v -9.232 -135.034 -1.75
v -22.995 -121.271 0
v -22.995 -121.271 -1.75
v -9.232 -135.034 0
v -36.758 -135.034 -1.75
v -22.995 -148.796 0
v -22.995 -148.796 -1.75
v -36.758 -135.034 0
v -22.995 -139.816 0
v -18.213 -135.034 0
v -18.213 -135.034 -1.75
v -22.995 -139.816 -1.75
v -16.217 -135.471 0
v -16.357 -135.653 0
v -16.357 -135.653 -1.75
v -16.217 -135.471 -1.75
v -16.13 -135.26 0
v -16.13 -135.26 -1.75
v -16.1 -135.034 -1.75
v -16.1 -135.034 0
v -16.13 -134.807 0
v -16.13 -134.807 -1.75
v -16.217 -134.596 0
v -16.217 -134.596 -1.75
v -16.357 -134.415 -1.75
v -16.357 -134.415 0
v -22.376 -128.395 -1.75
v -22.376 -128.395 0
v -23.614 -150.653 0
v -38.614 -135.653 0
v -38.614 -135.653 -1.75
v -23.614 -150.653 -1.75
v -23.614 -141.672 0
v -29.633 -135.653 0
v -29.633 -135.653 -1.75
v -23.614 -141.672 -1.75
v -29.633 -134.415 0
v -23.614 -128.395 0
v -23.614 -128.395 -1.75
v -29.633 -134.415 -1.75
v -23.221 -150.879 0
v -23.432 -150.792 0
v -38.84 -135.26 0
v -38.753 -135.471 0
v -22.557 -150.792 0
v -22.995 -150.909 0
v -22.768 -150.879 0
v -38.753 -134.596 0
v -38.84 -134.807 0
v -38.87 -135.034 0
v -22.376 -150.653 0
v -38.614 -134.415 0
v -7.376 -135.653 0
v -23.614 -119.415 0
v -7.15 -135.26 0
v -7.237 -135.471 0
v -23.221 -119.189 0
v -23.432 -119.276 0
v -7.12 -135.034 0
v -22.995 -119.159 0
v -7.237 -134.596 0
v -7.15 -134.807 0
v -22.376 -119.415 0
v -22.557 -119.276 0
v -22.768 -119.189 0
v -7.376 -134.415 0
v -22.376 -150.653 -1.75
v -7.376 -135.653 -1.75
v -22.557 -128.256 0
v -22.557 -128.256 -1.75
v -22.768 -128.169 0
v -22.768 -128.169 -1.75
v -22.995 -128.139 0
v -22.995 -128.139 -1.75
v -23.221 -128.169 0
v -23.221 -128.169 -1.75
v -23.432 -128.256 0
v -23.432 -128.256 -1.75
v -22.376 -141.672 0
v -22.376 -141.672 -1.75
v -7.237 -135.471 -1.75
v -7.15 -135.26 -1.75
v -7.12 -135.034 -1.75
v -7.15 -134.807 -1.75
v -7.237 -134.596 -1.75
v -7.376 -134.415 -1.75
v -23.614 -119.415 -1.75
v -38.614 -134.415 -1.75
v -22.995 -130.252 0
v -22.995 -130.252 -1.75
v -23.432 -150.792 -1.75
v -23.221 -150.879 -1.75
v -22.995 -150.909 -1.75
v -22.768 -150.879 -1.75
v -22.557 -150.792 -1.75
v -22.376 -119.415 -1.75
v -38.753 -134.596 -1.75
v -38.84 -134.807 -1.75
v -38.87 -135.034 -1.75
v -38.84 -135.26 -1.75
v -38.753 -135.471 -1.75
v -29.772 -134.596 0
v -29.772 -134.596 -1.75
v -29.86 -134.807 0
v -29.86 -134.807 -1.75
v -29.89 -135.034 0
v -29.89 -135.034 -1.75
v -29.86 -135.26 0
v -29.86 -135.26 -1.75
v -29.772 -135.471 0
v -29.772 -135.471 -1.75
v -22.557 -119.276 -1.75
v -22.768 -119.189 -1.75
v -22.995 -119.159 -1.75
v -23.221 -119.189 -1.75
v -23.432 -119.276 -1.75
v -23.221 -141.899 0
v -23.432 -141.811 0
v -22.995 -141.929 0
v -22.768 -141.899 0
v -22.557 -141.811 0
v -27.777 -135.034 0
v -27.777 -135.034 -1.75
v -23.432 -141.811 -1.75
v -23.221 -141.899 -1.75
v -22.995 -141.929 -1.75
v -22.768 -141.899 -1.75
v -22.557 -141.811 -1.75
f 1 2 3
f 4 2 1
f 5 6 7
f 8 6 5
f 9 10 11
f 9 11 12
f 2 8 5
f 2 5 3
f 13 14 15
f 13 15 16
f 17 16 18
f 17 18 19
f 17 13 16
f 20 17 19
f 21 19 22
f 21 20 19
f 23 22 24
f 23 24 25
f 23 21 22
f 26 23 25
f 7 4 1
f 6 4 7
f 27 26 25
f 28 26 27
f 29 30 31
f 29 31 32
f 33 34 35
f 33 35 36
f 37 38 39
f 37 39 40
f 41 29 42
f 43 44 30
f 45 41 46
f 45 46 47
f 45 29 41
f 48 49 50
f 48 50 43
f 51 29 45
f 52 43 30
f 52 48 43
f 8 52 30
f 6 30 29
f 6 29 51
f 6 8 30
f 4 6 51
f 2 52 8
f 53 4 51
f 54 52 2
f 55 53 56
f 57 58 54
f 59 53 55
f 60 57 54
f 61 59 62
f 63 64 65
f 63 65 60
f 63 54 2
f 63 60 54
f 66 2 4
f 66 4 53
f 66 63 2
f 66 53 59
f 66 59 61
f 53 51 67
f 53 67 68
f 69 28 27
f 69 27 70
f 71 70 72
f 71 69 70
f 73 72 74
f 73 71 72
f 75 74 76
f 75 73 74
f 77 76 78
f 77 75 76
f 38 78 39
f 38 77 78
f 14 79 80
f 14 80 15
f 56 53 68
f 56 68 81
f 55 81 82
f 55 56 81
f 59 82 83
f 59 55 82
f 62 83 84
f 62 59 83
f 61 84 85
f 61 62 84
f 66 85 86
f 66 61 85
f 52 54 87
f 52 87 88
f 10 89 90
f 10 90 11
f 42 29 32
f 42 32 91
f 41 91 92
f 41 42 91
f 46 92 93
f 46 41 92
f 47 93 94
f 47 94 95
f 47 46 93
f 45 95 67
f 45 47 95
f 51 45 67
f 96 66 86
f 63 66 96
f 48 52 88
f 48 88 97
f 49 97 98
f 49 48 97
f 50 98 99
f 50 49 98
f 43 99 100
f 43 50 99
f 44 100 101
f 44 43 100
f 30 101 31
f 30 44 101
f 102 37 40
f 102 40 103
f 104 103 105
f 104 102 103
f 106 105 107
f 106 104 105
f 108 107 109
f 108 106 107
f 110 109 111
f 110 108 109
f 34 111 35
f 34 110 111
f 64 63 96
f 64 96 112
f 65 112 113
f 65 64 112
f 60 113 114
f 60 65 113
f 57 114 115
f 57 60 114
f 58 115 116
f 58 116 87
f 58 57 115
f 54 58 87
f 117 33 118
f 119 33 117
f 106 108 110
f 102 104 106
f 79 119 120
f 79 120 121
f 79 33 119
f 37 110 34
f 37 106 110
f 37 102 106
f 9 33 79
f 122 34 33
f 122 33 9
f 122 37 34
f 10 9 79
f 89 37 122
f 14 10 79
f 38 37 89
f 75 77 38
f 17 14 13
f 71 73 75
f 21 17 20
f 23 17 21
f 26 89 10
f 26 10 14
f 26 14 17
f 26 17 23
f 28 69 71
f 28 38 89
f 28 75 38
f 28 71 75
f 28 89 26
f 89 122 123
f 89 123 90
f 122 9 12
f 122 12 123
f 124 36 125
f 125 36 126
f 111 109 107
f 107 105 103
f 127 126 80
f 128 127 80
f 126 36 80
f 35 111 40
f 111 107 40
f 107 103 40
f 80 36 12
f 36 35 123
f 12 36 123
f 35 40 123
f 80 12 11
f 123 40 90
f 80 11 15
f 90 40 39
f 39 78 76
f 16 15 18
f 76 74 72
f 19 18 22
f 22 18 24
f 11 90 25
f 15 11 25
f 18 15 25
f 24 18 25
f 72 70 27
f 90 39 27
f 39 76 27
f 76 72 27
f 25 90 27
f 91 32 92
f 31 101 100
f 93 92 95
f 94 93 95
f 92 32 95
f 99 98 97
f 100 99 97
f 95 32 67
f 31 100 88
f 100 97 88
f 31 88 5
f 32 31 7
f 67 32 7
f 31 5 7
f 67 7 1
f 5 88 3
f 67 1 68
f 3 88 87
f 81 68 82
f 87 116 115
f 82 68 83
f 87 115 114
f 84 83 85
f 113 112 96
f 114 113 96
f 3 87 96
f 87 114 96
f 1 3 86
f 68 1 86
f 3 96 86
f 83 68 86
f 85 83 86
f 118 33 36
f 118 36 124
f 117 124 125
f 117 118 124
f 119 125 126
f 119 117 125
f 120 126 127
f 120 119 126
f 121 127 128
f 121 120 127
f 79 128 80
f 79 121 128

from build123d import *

# Parameters (mm, degrees)
BOSS_EXTRUDE1_DEPTH   = 1.75
BOSS_EXTRUDE1_2_DEPTH = 1.75


with BuildPart() as part:
    # Sketch2 → Boss-Extrude1 (new body)
    with BuildSketch(Plane.XY):
        with BuildLine():
            Line((-22.376246782, -150.652582773), (-7.376246782, -135.652582773))
            ThreePointArc((-7.376246782, -135.652582773), (-7.119965216, -135.03386434), (-7.376246782, -134.415145906))
            Line((-7.376246782, -134.415145906), (-22.376246782, -119.415145906))
            ThreePointArc((-22.376246782, -119.415145906), (-22.994965216, -119.15886434), (-23.613683649, -119.415145906))
            Line((-23.613683649, -119.415145906), (-38.613683649, -134.415145906))
            ThreePointArc((-38.613683649, -134.415145906), (-38.869965216, -135.03386434), (-38.613683649, -135.652582773))
            Line((-38.613683649, -135.652582773), (-23.613683649, -150.652582773))
            ThreePointArc((-23.613683649, -150.652582773), (-22.994965216, -150.90886434), (-22.376246782, -150.652582773))
        make_face()
        Polygon((-22.994965216, -121.271301207), (-9.232402083, -135.03386434), (-22.994965216, -148.796427473), (-36.757528349, -135.03386434), align=None, mode=Mode.SUBTRACT)
    extrude(amount=-BOSS_EXTRUDE1_DEPTH)


with BuildPart() as body_2:
    # Sketch2 → Boss-Extrude1 2 (new body)
    with BuildSketch(Plane.XY):
        with BuildLine():
            Line((-22.376246782, -141.672326652), (-16.356502903, -135.652582773))
            ThreePointArc((-16.356502903, -135.652582773), (-16.100221337, -135.03386434), (-16.356502903, -134.415145906))
            Line((-16.356502903, -134.415145906), (-22.376246782, -128.395402027))
            ThreePointArc((-22.376246782, -128.395402027), (-22.994965216, -128.139120461), (-23.613683649, -128.395402027))
            Line((-23.613683649, -128.395402027), (-29.633427528, -134.415145906))
            ThreePointArc((-29.633427528, -134.415145906), (-29.889709095, -135.03386434), (-29.633427528, -135.652582773))
            Line((-29.633427528, -135.652582773), (-23.613683649, -141.672326652))
            ThreePointArc((-23.613683649, -141.672326652), (-22.994965216, -141.928608219), (-22.376246782, -141.672326652))
        make_face()
        Polygon((-22.994965216, -130.251557328), (-18.212658204, -135.03386434), (-22.994965216, -139.816171352), (-27.777272227, -135.03386434), align=None, mode=Mode.SUBTRACT)
    extrude(amount=-BOSS_EXTRUDE1_2_DEPTH)


solid = Compound([part.part, body_2.part])
